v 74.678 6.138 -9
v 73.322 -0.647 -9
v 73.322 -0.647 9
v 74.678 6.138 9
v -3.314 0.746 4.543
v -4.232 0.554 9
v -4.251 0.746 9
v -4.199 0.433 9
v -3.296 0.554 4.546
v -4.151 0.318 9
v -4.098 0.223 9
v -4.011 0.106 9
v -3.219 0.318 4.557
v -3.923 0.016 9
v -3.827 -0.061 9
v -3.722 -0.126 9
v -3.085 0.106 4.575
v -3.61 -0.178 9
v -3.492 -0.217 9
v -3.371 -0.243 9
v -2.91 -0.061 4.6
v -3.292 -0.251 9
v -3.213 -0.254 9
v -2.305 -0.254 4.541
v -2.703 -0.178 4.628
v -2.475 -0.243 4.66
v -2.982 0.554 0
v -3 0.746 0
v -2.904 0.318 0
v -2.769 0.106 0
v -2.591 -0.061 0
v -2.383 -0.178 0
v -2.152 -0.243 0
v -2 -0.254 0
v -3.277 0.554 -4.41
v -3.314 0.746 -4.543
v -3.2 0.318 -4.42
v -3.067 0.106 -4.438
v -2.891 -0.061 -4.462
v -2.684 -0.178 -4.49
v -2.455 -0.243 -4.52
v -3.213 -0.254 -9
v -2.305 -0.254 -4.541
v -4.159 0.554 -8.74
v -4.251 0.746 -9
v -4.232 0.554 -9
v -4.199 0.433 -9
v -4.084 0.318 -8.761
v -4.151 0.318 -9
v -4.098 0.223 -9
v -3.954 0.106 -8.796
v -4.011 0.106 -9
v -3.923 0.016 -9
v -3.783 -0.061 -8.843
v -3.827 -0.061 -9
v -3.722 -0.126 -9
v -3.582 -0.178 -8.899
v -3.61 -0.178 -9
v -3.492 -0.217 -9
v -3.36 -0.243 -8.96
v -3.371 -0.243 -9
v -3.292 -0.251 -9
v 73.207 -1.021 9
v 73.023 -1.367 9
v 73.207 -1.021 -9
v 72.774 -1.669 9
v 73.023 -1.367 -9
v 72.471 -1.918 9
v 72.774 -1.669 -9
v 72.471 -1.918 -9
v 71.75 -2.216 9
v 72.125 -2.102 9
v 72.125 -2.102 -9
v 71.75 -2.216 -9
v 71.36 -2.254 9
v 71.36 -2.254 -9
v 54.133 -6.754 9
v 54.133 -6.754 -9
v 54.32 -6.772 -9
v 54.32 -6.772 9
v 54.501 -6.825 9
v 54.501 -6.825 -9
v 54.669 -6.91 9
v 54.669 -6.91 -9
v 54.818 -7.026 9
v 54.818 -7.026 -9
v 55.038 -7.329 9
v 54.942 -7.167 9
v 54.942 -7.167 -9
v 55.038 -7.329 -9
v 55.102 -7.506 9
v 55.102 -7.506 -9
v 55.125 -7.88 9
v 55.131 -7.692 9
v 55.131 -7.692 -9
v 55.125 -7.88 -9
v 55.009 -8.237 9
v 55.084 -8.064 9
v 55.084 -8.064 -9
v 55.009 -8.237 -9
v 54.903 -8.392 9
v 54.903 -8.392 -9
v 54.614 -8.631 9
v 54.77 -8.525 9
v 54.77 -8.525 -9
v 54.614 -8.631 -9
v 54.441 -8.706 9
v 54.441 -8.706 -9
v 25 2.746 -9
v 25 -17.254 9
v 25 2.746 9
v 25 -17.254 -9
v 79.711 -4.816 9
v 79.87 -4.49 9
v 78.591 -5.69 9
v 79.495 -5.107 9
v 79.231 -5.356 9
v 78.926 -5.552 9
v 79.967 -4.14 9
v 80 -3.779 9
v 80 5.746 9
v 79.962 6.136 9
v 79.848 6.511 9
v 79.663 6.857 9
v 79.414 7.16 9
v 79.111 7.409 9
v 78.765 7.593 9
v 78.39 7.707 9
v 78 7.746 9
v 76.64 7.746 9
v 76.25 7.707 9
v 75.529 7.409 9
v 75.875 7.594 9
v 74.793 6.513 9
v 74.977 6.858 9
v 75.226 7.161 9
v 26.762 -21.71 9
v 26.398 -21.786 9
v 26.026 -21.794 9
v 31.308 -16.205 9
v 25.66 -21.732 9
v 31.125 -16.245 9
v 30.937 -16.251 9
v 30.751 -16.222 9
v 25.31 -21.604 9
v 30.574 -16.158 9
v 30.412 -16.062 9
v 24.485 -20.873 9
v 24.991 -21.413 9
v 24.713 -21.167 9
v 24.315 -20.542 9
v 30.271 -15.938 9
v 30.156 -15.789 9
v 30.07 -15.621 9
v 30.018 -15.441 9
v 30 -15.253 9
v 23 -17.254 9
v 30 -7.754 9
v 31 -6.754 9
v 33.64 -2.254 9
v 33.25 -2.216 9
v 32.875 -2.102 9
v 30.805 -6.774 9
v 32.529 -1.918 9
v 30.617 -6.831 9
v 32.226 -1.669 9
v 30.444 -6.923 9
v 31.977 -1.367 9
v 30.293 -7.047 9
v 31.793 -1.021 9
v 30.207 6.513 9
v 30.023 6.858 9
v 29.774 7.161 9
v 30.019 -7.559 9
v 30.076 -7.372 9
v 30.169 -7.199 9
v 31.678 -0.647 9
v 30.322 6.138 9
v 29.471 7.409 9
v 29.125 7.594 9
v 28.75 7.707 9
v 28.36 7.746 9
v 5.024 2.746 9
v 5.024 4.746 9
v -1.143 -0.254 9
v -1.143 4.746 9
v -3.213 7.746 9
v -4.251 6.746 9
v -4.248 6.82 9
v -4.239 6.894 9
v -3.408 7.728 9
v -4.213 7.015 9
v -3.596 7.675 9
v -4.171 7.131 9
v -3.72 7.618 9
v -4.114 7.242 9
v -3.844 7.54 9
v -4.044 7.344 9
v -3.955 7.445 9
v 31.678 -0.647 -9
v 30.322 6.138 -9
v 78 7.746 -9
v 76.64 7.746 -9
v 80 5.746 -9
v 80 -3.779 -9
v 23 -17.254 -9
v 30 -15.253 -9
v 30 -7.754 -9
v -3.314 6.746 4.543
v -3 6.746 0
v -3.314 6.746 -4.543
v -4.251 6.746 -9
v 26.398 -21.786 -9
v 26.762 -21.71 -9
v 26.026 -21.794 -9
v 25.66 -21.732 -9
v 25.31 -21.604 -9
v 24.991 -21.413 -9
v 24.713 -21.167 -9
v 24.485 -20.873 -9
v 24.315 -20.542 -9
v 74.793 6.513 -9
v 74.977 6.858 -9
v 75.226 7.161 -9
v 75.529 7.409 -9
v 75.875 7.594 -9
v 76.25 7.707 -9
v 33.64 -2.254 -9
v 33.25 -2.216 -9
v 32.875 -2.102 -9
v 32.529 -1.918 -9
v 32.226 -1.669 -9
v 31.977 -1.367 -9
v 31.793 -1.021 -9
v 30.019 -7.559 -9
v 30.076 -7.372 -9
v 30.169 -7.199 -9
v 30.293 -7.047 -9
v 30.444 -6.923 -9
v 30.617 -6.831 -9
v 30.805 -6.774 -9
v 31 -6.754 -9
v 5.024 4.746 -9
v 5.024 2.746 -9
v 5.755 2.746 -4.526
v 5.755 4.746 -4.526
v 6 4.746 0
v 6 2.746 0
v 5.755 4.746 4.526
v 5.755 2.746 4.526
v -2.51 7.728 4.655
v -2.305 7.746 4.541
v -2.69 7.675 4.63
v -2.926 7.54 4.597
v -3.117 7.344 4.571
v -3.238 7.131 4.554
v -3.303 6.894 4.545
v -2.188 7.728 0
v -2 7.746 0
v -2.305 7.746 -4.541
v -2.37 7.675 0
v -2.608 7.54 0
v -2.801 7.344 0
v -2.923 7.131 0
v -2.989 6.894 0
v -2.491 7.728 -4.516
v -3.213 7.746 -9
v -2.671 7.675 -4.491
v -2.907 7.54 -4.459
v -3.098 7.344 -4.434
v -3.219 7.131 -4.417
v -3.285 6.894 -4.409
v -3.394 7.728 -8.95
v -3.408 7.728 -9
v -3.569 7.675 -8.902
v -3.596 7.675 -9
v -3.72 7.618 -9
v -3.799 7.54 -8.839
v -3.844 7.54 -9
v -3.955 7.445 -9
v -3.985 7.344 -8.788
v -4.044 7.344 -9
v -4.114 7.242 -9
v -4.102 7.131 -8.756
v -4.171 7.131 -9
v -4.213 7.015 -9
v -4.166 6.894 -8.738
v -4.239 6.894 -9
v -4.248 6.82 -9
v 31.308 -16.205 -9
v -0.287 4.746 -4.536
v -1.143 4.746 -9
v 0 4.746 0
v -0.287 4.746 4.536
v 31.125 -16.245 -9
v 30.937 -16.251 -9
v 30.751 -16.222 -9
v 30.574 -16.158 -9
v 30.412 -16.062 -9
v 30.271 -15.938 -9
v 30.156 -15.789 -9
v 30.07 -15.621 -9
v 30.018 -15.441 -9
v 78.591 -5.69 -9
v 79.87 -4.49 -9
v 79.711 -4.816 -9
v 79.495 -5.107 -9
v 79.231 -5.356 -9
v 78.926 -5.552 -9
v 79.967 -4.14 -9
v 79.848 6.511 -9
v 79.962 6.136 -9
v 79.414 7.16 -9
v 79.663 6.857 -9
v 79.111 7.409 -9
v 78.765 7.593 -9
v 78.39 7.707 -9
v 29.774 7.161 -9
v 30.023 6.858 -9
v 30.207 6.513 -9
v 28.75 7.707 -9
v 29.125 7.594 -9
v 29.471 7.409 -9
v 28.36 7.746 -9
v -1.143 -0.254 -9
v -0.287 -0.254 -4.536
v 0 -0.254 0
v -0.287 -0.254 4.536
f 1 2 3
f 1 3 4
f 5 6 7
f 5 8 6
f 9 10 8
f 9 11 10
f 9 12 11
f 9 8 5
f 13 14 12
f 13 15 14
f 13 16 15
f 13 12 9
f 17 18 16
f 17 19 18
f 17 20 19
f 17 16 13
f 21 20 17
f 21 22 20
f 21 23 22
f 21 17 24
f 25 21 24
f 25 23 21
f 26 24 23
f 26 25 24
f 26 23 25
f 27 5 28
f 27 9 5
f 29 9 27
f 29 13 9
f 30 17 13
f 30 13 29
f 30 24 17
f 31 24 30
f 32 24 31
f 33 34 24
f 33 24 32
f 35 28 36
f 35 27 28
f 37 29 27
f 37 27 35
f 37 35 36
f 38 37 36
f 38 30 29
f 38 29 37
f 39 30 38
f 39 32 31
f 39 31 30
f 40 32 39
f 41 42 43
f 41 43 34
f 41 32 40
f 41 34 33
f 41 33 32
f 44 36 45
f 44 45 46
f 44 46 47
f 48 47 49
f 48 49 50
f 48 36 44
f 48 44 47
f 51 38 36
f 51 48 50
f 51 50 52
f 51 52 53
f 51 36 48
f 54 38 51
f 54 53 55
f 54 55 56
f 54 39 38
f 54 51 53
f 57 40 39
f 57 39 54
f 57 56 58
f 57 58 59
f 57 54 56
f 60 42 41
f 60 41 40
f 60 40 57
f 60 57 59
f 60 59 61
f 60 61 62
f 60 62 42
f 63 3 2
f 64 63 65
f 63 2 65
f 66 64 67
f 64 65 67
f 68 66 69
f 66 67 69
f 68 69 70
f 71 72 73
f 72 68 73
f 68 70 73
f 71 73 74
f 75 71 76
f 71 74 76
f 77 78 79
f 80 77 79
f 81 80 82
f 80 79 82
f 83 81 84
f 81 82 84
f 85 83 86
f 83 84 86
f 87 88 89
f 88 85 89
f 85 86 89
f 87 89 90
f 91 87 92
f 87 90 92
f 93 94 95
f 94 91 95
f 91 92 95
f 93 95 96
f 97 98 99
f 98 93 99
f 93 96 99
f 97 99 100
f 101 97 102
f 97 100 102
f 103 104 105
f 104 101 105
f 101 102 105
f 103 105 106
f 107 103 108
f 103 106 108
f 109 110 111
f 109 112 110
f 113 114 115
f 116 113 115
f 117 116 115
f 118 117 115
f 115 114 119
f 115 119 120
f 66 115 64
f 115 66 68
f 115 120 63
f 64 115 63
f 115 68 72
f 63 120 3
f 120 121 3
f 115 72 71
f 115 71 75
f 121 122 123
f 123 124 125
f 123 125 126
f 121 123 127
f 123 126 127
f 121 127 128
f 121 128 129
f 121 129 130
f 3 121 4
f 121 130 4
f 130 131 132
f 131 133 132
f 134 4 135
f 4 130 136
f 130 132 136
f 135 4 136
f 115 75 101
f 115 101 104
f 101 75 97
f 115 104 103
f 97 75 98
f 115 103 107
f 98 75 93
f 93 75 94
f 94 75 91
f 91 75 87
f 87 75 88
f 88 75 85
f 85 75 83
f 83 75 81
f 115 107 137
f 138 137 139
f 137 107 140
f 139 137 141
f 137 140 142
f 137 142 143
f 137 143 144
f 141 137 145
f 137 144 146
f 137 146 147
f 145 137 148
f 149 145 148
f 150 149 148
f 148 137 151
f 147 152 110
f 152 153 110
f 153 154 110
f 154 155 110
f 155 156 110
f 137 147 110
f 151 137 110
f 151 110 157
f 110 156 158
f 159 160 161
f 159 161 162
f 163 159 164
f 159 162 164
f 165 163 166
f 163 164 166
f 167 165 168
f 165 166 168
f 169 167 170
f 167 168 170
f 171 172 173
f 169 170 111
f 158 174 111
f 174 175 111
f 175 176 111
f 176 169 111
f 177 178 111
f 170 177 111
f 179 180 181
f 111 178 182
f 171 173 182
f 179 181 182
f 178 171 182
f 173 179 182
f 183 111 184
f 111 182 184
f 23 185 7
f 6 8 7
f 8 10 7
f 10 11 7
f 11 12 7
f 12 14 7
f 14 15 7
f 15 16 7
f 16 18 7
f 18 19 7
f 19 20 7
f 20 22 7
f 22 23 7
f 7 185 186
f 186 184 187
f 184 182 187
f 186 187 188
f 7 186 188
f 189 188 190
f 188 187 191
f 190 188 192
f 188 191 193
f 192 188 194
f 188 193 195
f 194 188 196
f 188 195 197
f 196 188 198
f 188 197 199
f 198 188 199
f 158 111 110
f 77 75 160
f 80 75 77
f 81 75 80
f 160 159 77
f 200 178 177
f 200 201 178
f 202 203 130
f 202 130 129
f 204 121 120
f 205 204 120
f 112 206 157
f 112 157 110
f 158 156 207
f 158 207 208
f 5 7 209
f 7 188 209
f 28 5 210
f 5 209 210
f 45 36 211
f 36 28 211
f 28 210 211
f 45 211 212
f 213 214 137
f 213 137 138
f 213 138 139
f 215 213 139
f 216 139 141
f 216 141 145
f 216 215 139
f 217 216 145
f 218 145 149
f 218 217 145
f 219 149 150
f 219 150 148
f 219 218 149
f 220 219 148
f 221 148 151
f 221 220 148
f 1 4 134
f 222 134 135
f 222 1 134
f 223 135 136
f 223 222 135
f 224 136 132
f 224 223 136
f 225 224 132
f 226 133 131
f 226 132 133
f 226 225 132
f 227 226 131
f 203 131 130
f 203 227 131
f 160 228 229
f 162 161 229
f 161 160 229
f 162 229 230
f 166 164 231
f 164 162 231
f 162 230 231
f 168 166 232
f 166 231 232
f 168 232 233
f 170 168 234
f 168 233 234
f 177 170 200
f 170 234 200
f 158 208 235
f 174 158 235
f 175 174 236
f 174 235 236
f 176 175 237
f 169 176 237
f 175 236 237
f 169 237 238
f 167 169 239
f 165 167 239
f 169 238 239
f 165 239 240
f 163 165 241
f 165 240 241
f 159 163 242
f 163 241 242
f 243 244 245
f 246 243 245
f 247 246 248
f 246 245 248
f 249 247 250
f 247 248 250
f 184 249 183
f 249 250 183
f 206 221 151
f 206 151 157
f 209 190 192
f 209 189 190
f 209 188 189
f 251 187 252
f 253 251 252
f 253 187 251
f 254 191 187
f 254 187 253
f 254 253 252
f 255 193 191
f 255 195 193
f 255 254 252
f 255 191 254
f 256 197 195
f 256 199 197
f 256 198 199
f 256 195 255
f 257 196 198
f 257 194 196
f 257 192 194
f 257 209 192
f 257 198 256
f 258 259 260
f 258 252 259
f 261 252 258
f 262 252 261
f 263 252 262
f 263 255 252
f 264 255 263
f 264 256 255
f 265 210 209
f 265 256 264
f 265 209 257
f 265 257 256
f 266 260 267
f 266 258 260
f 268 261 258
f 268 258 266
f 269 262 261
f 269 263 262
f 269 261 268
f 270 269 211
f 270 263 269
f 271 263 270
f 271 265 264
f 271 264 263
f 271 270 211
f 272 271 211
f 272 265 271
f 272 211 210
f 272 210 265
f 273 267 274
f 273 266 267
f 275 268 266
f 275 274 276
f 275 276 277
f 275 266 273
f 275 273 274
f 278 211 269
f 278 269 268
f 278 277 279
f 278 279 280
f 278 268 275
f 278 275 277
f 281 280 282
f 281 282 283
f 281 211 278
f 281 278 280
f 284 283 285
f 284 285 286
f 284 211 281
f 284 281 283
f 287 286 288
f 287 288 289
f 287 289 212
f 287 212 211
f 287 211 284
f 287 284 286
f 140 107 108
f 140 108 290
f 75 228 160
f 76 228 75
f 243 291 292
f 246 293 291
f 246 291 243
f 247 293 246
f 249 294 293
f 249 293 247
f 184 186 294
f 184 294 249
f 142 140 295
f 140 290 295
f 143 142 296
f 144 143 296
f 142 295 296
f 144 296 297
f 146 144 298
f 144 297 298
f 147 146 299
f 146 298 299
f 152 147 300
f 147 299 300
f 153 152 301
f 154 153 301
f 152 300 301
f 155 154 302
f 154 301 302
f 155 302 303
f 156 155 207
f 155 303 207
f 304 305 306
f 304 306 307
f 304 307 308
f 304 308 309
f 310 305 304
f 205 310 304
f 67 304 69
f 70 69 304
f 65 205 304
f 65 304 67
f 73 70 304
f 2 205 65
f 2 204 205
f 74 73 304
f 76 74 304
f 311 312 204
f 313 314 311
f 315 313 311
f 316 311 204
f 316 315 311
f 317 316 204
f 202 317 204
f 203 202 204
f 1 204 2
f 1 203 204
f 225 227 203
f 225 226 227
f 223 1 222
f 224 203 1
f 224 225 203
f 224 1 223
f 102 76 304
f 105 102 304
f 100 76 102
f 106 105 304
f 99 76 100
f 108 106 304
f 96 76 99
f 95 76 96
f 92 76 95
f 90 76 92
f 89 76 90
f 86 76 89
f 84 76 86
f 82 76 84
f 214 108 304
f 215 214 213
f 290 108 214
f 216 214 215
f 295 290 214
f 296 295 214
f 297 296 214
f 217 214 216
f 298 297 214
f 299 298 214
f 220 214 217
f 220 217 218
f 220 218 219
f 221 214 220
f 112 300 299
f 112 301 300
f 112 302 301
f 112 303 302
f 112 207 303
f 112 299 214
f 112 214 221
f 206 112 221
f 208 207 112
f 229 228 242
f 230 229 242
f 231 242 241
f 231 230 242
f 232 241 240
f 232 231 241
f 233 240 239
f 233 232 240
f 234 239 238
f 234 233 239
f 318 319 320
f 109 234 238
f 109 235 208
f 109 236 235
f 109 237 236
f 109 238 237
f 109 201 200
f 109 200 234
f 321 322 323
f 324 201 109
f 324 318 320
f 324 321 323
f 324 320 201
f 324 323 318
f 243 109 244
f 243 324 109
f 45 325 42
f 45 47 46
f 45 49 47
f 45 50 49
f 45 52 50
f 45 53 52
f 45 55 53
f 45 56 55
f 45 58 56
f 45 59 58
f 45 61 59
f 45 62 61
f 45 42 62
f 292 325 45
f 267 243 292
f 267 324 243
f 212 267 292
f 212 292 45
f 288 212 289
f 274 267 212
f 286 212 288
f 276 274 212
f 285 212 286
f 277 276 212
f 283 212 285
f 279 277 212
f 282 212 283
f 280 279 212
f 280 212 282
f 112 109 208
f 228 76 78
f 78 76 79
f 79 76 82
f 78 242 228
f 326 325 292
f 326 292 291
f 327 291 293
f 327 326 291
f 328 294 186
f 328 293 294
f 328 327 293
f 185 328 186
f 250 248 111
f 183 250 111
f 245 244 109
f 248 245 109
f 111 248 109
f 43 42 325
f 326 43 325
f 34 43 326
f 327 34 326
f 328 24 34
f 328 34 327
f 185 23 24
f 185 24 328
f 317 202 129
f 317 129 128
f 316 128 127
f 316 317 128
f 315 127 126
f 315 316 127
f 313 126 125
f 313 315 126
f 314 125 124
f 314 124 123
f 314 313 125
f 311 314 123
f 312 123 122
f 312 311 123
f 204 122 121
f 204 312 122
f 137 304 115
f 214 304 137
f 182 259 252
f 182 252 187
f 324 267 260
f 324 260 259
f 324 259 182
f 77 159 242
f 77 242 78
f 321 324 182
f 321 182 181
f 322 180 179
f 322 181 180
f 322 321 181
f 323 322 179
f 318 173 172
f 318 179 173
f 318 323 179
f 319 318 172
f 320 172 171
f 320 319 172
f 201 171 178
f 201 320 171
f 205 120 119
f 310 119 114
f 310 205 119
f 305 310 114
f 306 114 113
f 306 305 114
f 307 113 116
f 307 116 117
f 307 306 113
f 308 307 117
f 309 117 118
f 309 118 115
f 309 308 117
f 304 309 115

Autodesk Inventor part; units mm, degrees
ref_plane "YZ Plane" through (0, 0, 0) normal (1, 0, 0) x (0, 1, 0)
ref_plane "XZ Plane" through (0, 0, 0) normal (0, 1, 0) x (-1, 0, 0)
ref_plane "XY Plane" through (0, 0, 0) normal (0, 0, 1) x (1, 0, 0)
sketch "Sketch1" plane through (0, 0, 0) normal (0, 0, 1) x (1, 0, 0)
  line L0 (0, 7.7456) -> (30, 7.7456)
  line L1 (30, 7.7456) -> (32, -2.2544)
  line L2 (32, -2.2544) -> (73, -2.2544)
  line L3 (73, -2.2544) -> (75, 7.7456)
  line L4 (23, -17.2544) -> (25, -17.2544)
  line L5 (25, -17.2544) -> (25, 2.7456)
  line L6 (25, 2.7456) -> (6, 2.7456)
  line L7 (75, 7.7456) -> (80, 7.7456)
  line L8 (80, 7.7456) -> (80, -5.2544)
  line L9 (80, -5.2544) -> (25, -22.2544)
  line L10 (25, -22.2544) -> (23, -17.2544)
  line L11 (0, 7.7456) -> (0, 2.7456)
  line L12 (0, 2.7456) -> (6, 2.7456)
  point P0 (0, 0)
  dimension "d0" = 20
  dimension "d4" = 5
  dimension "d7" = 2
  dimension "d8" = 10
  dimension "d9" = 45
  dimension "d11" = 41
  dimension "d12" = 2
  dimension "d13" = 5
  dimension "d14" = 13
  dimension "d15" = 5
  dimension "d18" = 0
  dimension "d19" = 6
  dimension "d20" = 30
  dimension "d21" = 25
  dimension "d26" = 2.7456
  dimension "d27" = 2.7456
extrude "Extrusion1" add sketch "Sketch1" along normal mid plane 18
sketch "Sketch4" plane through (0, 2.7456, 9) normal (0, -1, 0) x (1, 0, 0)
  arc A0 (-1.1431, -18) -> (-1.1431, 0) centre (-36, -9) ccw
  line L0 (0, 0) -> (0, -18) projected
  arc A1 (5.0244, -18) -> (5.0244, 0) centre (-36, -9) ccw
  arc A2 (-4.251, -18) -> (-4.251, 0) centre (-36, -9) ccw
  line L1 (30, 0) -> (0, 0) projected
  line L2 (5.0244, 0) -> (-4.251, 0)
  line L3 (0, -18) -> (30, -18) projected
  line L4 (5.0244, -18) -> (-4.251, -18)
  point P0 (0, -9)
  dimension "d28" = 72
  dimension "d29" = 36
  dimension "d30" = 84
  dimension "d31" = 66
extrude "Extrusion2" add sketch "Sketch4" against normal blind 5
extrude "Extrusion3" add sketch "Sketch4" along normal blind 3 contours L4 A2 L2 A0
extrude "Extrusion4" cut sketch "Sketch4" against normal blind 2 contours A0 L0 L4 | A0 L2 L0 | L0 L1 A1 L3
fillet "Fillet1" radius 2 2 edges at (30, 7.7456, 0) (75, 7.7456, 0)
fillet "Fillet2" radius 2 5 edges at (73, -2.2544, 0) (32, -2.2544, 0) (25, -22.2544, 0) (80, -5.2544, 0) (80, 7.7456, 0)
fillet "Fillet3" radius 1 2 edges at (-3, 7.7456, 0) (-3, -0.2544, 0)
sketch "Sketch5" plane through (0, 0, 9) normal (0, 0, 1) x (1, 0, 0)
  line L0 (30, -6.7544) -> (60.4607, -6.7544)
  line L1 (60.4607, -6.7544) -> (30, -16.6287)
  line L2 (30, -16.6287) -> (30, -6.7544)
  line L3 (71.3604, -2.2544) -> (33.6396, -2.2544) projected
  line L4 (26.7625, -21.7097) -> (78.5906, -5.6901) projected
  line L5 (25, 2.7456) -> (25, -17.2544) projected
  point P0 (0, 0)
  dimension "d41" = 4.5
  dimension "d42" = 0.785
  dimension "d43" = 5
extrude "Extrusion5" cut sketch "Sketch5" against normal through all
fillet "Fillet4" radius 1 3 edges at (60.4607, -6.7544, 0) (30, -6.7544, 0) (30, -16.6287, 0)
equation "\"d29\" = 0.5 * d28"
properties part number "HeadphoneMount"
